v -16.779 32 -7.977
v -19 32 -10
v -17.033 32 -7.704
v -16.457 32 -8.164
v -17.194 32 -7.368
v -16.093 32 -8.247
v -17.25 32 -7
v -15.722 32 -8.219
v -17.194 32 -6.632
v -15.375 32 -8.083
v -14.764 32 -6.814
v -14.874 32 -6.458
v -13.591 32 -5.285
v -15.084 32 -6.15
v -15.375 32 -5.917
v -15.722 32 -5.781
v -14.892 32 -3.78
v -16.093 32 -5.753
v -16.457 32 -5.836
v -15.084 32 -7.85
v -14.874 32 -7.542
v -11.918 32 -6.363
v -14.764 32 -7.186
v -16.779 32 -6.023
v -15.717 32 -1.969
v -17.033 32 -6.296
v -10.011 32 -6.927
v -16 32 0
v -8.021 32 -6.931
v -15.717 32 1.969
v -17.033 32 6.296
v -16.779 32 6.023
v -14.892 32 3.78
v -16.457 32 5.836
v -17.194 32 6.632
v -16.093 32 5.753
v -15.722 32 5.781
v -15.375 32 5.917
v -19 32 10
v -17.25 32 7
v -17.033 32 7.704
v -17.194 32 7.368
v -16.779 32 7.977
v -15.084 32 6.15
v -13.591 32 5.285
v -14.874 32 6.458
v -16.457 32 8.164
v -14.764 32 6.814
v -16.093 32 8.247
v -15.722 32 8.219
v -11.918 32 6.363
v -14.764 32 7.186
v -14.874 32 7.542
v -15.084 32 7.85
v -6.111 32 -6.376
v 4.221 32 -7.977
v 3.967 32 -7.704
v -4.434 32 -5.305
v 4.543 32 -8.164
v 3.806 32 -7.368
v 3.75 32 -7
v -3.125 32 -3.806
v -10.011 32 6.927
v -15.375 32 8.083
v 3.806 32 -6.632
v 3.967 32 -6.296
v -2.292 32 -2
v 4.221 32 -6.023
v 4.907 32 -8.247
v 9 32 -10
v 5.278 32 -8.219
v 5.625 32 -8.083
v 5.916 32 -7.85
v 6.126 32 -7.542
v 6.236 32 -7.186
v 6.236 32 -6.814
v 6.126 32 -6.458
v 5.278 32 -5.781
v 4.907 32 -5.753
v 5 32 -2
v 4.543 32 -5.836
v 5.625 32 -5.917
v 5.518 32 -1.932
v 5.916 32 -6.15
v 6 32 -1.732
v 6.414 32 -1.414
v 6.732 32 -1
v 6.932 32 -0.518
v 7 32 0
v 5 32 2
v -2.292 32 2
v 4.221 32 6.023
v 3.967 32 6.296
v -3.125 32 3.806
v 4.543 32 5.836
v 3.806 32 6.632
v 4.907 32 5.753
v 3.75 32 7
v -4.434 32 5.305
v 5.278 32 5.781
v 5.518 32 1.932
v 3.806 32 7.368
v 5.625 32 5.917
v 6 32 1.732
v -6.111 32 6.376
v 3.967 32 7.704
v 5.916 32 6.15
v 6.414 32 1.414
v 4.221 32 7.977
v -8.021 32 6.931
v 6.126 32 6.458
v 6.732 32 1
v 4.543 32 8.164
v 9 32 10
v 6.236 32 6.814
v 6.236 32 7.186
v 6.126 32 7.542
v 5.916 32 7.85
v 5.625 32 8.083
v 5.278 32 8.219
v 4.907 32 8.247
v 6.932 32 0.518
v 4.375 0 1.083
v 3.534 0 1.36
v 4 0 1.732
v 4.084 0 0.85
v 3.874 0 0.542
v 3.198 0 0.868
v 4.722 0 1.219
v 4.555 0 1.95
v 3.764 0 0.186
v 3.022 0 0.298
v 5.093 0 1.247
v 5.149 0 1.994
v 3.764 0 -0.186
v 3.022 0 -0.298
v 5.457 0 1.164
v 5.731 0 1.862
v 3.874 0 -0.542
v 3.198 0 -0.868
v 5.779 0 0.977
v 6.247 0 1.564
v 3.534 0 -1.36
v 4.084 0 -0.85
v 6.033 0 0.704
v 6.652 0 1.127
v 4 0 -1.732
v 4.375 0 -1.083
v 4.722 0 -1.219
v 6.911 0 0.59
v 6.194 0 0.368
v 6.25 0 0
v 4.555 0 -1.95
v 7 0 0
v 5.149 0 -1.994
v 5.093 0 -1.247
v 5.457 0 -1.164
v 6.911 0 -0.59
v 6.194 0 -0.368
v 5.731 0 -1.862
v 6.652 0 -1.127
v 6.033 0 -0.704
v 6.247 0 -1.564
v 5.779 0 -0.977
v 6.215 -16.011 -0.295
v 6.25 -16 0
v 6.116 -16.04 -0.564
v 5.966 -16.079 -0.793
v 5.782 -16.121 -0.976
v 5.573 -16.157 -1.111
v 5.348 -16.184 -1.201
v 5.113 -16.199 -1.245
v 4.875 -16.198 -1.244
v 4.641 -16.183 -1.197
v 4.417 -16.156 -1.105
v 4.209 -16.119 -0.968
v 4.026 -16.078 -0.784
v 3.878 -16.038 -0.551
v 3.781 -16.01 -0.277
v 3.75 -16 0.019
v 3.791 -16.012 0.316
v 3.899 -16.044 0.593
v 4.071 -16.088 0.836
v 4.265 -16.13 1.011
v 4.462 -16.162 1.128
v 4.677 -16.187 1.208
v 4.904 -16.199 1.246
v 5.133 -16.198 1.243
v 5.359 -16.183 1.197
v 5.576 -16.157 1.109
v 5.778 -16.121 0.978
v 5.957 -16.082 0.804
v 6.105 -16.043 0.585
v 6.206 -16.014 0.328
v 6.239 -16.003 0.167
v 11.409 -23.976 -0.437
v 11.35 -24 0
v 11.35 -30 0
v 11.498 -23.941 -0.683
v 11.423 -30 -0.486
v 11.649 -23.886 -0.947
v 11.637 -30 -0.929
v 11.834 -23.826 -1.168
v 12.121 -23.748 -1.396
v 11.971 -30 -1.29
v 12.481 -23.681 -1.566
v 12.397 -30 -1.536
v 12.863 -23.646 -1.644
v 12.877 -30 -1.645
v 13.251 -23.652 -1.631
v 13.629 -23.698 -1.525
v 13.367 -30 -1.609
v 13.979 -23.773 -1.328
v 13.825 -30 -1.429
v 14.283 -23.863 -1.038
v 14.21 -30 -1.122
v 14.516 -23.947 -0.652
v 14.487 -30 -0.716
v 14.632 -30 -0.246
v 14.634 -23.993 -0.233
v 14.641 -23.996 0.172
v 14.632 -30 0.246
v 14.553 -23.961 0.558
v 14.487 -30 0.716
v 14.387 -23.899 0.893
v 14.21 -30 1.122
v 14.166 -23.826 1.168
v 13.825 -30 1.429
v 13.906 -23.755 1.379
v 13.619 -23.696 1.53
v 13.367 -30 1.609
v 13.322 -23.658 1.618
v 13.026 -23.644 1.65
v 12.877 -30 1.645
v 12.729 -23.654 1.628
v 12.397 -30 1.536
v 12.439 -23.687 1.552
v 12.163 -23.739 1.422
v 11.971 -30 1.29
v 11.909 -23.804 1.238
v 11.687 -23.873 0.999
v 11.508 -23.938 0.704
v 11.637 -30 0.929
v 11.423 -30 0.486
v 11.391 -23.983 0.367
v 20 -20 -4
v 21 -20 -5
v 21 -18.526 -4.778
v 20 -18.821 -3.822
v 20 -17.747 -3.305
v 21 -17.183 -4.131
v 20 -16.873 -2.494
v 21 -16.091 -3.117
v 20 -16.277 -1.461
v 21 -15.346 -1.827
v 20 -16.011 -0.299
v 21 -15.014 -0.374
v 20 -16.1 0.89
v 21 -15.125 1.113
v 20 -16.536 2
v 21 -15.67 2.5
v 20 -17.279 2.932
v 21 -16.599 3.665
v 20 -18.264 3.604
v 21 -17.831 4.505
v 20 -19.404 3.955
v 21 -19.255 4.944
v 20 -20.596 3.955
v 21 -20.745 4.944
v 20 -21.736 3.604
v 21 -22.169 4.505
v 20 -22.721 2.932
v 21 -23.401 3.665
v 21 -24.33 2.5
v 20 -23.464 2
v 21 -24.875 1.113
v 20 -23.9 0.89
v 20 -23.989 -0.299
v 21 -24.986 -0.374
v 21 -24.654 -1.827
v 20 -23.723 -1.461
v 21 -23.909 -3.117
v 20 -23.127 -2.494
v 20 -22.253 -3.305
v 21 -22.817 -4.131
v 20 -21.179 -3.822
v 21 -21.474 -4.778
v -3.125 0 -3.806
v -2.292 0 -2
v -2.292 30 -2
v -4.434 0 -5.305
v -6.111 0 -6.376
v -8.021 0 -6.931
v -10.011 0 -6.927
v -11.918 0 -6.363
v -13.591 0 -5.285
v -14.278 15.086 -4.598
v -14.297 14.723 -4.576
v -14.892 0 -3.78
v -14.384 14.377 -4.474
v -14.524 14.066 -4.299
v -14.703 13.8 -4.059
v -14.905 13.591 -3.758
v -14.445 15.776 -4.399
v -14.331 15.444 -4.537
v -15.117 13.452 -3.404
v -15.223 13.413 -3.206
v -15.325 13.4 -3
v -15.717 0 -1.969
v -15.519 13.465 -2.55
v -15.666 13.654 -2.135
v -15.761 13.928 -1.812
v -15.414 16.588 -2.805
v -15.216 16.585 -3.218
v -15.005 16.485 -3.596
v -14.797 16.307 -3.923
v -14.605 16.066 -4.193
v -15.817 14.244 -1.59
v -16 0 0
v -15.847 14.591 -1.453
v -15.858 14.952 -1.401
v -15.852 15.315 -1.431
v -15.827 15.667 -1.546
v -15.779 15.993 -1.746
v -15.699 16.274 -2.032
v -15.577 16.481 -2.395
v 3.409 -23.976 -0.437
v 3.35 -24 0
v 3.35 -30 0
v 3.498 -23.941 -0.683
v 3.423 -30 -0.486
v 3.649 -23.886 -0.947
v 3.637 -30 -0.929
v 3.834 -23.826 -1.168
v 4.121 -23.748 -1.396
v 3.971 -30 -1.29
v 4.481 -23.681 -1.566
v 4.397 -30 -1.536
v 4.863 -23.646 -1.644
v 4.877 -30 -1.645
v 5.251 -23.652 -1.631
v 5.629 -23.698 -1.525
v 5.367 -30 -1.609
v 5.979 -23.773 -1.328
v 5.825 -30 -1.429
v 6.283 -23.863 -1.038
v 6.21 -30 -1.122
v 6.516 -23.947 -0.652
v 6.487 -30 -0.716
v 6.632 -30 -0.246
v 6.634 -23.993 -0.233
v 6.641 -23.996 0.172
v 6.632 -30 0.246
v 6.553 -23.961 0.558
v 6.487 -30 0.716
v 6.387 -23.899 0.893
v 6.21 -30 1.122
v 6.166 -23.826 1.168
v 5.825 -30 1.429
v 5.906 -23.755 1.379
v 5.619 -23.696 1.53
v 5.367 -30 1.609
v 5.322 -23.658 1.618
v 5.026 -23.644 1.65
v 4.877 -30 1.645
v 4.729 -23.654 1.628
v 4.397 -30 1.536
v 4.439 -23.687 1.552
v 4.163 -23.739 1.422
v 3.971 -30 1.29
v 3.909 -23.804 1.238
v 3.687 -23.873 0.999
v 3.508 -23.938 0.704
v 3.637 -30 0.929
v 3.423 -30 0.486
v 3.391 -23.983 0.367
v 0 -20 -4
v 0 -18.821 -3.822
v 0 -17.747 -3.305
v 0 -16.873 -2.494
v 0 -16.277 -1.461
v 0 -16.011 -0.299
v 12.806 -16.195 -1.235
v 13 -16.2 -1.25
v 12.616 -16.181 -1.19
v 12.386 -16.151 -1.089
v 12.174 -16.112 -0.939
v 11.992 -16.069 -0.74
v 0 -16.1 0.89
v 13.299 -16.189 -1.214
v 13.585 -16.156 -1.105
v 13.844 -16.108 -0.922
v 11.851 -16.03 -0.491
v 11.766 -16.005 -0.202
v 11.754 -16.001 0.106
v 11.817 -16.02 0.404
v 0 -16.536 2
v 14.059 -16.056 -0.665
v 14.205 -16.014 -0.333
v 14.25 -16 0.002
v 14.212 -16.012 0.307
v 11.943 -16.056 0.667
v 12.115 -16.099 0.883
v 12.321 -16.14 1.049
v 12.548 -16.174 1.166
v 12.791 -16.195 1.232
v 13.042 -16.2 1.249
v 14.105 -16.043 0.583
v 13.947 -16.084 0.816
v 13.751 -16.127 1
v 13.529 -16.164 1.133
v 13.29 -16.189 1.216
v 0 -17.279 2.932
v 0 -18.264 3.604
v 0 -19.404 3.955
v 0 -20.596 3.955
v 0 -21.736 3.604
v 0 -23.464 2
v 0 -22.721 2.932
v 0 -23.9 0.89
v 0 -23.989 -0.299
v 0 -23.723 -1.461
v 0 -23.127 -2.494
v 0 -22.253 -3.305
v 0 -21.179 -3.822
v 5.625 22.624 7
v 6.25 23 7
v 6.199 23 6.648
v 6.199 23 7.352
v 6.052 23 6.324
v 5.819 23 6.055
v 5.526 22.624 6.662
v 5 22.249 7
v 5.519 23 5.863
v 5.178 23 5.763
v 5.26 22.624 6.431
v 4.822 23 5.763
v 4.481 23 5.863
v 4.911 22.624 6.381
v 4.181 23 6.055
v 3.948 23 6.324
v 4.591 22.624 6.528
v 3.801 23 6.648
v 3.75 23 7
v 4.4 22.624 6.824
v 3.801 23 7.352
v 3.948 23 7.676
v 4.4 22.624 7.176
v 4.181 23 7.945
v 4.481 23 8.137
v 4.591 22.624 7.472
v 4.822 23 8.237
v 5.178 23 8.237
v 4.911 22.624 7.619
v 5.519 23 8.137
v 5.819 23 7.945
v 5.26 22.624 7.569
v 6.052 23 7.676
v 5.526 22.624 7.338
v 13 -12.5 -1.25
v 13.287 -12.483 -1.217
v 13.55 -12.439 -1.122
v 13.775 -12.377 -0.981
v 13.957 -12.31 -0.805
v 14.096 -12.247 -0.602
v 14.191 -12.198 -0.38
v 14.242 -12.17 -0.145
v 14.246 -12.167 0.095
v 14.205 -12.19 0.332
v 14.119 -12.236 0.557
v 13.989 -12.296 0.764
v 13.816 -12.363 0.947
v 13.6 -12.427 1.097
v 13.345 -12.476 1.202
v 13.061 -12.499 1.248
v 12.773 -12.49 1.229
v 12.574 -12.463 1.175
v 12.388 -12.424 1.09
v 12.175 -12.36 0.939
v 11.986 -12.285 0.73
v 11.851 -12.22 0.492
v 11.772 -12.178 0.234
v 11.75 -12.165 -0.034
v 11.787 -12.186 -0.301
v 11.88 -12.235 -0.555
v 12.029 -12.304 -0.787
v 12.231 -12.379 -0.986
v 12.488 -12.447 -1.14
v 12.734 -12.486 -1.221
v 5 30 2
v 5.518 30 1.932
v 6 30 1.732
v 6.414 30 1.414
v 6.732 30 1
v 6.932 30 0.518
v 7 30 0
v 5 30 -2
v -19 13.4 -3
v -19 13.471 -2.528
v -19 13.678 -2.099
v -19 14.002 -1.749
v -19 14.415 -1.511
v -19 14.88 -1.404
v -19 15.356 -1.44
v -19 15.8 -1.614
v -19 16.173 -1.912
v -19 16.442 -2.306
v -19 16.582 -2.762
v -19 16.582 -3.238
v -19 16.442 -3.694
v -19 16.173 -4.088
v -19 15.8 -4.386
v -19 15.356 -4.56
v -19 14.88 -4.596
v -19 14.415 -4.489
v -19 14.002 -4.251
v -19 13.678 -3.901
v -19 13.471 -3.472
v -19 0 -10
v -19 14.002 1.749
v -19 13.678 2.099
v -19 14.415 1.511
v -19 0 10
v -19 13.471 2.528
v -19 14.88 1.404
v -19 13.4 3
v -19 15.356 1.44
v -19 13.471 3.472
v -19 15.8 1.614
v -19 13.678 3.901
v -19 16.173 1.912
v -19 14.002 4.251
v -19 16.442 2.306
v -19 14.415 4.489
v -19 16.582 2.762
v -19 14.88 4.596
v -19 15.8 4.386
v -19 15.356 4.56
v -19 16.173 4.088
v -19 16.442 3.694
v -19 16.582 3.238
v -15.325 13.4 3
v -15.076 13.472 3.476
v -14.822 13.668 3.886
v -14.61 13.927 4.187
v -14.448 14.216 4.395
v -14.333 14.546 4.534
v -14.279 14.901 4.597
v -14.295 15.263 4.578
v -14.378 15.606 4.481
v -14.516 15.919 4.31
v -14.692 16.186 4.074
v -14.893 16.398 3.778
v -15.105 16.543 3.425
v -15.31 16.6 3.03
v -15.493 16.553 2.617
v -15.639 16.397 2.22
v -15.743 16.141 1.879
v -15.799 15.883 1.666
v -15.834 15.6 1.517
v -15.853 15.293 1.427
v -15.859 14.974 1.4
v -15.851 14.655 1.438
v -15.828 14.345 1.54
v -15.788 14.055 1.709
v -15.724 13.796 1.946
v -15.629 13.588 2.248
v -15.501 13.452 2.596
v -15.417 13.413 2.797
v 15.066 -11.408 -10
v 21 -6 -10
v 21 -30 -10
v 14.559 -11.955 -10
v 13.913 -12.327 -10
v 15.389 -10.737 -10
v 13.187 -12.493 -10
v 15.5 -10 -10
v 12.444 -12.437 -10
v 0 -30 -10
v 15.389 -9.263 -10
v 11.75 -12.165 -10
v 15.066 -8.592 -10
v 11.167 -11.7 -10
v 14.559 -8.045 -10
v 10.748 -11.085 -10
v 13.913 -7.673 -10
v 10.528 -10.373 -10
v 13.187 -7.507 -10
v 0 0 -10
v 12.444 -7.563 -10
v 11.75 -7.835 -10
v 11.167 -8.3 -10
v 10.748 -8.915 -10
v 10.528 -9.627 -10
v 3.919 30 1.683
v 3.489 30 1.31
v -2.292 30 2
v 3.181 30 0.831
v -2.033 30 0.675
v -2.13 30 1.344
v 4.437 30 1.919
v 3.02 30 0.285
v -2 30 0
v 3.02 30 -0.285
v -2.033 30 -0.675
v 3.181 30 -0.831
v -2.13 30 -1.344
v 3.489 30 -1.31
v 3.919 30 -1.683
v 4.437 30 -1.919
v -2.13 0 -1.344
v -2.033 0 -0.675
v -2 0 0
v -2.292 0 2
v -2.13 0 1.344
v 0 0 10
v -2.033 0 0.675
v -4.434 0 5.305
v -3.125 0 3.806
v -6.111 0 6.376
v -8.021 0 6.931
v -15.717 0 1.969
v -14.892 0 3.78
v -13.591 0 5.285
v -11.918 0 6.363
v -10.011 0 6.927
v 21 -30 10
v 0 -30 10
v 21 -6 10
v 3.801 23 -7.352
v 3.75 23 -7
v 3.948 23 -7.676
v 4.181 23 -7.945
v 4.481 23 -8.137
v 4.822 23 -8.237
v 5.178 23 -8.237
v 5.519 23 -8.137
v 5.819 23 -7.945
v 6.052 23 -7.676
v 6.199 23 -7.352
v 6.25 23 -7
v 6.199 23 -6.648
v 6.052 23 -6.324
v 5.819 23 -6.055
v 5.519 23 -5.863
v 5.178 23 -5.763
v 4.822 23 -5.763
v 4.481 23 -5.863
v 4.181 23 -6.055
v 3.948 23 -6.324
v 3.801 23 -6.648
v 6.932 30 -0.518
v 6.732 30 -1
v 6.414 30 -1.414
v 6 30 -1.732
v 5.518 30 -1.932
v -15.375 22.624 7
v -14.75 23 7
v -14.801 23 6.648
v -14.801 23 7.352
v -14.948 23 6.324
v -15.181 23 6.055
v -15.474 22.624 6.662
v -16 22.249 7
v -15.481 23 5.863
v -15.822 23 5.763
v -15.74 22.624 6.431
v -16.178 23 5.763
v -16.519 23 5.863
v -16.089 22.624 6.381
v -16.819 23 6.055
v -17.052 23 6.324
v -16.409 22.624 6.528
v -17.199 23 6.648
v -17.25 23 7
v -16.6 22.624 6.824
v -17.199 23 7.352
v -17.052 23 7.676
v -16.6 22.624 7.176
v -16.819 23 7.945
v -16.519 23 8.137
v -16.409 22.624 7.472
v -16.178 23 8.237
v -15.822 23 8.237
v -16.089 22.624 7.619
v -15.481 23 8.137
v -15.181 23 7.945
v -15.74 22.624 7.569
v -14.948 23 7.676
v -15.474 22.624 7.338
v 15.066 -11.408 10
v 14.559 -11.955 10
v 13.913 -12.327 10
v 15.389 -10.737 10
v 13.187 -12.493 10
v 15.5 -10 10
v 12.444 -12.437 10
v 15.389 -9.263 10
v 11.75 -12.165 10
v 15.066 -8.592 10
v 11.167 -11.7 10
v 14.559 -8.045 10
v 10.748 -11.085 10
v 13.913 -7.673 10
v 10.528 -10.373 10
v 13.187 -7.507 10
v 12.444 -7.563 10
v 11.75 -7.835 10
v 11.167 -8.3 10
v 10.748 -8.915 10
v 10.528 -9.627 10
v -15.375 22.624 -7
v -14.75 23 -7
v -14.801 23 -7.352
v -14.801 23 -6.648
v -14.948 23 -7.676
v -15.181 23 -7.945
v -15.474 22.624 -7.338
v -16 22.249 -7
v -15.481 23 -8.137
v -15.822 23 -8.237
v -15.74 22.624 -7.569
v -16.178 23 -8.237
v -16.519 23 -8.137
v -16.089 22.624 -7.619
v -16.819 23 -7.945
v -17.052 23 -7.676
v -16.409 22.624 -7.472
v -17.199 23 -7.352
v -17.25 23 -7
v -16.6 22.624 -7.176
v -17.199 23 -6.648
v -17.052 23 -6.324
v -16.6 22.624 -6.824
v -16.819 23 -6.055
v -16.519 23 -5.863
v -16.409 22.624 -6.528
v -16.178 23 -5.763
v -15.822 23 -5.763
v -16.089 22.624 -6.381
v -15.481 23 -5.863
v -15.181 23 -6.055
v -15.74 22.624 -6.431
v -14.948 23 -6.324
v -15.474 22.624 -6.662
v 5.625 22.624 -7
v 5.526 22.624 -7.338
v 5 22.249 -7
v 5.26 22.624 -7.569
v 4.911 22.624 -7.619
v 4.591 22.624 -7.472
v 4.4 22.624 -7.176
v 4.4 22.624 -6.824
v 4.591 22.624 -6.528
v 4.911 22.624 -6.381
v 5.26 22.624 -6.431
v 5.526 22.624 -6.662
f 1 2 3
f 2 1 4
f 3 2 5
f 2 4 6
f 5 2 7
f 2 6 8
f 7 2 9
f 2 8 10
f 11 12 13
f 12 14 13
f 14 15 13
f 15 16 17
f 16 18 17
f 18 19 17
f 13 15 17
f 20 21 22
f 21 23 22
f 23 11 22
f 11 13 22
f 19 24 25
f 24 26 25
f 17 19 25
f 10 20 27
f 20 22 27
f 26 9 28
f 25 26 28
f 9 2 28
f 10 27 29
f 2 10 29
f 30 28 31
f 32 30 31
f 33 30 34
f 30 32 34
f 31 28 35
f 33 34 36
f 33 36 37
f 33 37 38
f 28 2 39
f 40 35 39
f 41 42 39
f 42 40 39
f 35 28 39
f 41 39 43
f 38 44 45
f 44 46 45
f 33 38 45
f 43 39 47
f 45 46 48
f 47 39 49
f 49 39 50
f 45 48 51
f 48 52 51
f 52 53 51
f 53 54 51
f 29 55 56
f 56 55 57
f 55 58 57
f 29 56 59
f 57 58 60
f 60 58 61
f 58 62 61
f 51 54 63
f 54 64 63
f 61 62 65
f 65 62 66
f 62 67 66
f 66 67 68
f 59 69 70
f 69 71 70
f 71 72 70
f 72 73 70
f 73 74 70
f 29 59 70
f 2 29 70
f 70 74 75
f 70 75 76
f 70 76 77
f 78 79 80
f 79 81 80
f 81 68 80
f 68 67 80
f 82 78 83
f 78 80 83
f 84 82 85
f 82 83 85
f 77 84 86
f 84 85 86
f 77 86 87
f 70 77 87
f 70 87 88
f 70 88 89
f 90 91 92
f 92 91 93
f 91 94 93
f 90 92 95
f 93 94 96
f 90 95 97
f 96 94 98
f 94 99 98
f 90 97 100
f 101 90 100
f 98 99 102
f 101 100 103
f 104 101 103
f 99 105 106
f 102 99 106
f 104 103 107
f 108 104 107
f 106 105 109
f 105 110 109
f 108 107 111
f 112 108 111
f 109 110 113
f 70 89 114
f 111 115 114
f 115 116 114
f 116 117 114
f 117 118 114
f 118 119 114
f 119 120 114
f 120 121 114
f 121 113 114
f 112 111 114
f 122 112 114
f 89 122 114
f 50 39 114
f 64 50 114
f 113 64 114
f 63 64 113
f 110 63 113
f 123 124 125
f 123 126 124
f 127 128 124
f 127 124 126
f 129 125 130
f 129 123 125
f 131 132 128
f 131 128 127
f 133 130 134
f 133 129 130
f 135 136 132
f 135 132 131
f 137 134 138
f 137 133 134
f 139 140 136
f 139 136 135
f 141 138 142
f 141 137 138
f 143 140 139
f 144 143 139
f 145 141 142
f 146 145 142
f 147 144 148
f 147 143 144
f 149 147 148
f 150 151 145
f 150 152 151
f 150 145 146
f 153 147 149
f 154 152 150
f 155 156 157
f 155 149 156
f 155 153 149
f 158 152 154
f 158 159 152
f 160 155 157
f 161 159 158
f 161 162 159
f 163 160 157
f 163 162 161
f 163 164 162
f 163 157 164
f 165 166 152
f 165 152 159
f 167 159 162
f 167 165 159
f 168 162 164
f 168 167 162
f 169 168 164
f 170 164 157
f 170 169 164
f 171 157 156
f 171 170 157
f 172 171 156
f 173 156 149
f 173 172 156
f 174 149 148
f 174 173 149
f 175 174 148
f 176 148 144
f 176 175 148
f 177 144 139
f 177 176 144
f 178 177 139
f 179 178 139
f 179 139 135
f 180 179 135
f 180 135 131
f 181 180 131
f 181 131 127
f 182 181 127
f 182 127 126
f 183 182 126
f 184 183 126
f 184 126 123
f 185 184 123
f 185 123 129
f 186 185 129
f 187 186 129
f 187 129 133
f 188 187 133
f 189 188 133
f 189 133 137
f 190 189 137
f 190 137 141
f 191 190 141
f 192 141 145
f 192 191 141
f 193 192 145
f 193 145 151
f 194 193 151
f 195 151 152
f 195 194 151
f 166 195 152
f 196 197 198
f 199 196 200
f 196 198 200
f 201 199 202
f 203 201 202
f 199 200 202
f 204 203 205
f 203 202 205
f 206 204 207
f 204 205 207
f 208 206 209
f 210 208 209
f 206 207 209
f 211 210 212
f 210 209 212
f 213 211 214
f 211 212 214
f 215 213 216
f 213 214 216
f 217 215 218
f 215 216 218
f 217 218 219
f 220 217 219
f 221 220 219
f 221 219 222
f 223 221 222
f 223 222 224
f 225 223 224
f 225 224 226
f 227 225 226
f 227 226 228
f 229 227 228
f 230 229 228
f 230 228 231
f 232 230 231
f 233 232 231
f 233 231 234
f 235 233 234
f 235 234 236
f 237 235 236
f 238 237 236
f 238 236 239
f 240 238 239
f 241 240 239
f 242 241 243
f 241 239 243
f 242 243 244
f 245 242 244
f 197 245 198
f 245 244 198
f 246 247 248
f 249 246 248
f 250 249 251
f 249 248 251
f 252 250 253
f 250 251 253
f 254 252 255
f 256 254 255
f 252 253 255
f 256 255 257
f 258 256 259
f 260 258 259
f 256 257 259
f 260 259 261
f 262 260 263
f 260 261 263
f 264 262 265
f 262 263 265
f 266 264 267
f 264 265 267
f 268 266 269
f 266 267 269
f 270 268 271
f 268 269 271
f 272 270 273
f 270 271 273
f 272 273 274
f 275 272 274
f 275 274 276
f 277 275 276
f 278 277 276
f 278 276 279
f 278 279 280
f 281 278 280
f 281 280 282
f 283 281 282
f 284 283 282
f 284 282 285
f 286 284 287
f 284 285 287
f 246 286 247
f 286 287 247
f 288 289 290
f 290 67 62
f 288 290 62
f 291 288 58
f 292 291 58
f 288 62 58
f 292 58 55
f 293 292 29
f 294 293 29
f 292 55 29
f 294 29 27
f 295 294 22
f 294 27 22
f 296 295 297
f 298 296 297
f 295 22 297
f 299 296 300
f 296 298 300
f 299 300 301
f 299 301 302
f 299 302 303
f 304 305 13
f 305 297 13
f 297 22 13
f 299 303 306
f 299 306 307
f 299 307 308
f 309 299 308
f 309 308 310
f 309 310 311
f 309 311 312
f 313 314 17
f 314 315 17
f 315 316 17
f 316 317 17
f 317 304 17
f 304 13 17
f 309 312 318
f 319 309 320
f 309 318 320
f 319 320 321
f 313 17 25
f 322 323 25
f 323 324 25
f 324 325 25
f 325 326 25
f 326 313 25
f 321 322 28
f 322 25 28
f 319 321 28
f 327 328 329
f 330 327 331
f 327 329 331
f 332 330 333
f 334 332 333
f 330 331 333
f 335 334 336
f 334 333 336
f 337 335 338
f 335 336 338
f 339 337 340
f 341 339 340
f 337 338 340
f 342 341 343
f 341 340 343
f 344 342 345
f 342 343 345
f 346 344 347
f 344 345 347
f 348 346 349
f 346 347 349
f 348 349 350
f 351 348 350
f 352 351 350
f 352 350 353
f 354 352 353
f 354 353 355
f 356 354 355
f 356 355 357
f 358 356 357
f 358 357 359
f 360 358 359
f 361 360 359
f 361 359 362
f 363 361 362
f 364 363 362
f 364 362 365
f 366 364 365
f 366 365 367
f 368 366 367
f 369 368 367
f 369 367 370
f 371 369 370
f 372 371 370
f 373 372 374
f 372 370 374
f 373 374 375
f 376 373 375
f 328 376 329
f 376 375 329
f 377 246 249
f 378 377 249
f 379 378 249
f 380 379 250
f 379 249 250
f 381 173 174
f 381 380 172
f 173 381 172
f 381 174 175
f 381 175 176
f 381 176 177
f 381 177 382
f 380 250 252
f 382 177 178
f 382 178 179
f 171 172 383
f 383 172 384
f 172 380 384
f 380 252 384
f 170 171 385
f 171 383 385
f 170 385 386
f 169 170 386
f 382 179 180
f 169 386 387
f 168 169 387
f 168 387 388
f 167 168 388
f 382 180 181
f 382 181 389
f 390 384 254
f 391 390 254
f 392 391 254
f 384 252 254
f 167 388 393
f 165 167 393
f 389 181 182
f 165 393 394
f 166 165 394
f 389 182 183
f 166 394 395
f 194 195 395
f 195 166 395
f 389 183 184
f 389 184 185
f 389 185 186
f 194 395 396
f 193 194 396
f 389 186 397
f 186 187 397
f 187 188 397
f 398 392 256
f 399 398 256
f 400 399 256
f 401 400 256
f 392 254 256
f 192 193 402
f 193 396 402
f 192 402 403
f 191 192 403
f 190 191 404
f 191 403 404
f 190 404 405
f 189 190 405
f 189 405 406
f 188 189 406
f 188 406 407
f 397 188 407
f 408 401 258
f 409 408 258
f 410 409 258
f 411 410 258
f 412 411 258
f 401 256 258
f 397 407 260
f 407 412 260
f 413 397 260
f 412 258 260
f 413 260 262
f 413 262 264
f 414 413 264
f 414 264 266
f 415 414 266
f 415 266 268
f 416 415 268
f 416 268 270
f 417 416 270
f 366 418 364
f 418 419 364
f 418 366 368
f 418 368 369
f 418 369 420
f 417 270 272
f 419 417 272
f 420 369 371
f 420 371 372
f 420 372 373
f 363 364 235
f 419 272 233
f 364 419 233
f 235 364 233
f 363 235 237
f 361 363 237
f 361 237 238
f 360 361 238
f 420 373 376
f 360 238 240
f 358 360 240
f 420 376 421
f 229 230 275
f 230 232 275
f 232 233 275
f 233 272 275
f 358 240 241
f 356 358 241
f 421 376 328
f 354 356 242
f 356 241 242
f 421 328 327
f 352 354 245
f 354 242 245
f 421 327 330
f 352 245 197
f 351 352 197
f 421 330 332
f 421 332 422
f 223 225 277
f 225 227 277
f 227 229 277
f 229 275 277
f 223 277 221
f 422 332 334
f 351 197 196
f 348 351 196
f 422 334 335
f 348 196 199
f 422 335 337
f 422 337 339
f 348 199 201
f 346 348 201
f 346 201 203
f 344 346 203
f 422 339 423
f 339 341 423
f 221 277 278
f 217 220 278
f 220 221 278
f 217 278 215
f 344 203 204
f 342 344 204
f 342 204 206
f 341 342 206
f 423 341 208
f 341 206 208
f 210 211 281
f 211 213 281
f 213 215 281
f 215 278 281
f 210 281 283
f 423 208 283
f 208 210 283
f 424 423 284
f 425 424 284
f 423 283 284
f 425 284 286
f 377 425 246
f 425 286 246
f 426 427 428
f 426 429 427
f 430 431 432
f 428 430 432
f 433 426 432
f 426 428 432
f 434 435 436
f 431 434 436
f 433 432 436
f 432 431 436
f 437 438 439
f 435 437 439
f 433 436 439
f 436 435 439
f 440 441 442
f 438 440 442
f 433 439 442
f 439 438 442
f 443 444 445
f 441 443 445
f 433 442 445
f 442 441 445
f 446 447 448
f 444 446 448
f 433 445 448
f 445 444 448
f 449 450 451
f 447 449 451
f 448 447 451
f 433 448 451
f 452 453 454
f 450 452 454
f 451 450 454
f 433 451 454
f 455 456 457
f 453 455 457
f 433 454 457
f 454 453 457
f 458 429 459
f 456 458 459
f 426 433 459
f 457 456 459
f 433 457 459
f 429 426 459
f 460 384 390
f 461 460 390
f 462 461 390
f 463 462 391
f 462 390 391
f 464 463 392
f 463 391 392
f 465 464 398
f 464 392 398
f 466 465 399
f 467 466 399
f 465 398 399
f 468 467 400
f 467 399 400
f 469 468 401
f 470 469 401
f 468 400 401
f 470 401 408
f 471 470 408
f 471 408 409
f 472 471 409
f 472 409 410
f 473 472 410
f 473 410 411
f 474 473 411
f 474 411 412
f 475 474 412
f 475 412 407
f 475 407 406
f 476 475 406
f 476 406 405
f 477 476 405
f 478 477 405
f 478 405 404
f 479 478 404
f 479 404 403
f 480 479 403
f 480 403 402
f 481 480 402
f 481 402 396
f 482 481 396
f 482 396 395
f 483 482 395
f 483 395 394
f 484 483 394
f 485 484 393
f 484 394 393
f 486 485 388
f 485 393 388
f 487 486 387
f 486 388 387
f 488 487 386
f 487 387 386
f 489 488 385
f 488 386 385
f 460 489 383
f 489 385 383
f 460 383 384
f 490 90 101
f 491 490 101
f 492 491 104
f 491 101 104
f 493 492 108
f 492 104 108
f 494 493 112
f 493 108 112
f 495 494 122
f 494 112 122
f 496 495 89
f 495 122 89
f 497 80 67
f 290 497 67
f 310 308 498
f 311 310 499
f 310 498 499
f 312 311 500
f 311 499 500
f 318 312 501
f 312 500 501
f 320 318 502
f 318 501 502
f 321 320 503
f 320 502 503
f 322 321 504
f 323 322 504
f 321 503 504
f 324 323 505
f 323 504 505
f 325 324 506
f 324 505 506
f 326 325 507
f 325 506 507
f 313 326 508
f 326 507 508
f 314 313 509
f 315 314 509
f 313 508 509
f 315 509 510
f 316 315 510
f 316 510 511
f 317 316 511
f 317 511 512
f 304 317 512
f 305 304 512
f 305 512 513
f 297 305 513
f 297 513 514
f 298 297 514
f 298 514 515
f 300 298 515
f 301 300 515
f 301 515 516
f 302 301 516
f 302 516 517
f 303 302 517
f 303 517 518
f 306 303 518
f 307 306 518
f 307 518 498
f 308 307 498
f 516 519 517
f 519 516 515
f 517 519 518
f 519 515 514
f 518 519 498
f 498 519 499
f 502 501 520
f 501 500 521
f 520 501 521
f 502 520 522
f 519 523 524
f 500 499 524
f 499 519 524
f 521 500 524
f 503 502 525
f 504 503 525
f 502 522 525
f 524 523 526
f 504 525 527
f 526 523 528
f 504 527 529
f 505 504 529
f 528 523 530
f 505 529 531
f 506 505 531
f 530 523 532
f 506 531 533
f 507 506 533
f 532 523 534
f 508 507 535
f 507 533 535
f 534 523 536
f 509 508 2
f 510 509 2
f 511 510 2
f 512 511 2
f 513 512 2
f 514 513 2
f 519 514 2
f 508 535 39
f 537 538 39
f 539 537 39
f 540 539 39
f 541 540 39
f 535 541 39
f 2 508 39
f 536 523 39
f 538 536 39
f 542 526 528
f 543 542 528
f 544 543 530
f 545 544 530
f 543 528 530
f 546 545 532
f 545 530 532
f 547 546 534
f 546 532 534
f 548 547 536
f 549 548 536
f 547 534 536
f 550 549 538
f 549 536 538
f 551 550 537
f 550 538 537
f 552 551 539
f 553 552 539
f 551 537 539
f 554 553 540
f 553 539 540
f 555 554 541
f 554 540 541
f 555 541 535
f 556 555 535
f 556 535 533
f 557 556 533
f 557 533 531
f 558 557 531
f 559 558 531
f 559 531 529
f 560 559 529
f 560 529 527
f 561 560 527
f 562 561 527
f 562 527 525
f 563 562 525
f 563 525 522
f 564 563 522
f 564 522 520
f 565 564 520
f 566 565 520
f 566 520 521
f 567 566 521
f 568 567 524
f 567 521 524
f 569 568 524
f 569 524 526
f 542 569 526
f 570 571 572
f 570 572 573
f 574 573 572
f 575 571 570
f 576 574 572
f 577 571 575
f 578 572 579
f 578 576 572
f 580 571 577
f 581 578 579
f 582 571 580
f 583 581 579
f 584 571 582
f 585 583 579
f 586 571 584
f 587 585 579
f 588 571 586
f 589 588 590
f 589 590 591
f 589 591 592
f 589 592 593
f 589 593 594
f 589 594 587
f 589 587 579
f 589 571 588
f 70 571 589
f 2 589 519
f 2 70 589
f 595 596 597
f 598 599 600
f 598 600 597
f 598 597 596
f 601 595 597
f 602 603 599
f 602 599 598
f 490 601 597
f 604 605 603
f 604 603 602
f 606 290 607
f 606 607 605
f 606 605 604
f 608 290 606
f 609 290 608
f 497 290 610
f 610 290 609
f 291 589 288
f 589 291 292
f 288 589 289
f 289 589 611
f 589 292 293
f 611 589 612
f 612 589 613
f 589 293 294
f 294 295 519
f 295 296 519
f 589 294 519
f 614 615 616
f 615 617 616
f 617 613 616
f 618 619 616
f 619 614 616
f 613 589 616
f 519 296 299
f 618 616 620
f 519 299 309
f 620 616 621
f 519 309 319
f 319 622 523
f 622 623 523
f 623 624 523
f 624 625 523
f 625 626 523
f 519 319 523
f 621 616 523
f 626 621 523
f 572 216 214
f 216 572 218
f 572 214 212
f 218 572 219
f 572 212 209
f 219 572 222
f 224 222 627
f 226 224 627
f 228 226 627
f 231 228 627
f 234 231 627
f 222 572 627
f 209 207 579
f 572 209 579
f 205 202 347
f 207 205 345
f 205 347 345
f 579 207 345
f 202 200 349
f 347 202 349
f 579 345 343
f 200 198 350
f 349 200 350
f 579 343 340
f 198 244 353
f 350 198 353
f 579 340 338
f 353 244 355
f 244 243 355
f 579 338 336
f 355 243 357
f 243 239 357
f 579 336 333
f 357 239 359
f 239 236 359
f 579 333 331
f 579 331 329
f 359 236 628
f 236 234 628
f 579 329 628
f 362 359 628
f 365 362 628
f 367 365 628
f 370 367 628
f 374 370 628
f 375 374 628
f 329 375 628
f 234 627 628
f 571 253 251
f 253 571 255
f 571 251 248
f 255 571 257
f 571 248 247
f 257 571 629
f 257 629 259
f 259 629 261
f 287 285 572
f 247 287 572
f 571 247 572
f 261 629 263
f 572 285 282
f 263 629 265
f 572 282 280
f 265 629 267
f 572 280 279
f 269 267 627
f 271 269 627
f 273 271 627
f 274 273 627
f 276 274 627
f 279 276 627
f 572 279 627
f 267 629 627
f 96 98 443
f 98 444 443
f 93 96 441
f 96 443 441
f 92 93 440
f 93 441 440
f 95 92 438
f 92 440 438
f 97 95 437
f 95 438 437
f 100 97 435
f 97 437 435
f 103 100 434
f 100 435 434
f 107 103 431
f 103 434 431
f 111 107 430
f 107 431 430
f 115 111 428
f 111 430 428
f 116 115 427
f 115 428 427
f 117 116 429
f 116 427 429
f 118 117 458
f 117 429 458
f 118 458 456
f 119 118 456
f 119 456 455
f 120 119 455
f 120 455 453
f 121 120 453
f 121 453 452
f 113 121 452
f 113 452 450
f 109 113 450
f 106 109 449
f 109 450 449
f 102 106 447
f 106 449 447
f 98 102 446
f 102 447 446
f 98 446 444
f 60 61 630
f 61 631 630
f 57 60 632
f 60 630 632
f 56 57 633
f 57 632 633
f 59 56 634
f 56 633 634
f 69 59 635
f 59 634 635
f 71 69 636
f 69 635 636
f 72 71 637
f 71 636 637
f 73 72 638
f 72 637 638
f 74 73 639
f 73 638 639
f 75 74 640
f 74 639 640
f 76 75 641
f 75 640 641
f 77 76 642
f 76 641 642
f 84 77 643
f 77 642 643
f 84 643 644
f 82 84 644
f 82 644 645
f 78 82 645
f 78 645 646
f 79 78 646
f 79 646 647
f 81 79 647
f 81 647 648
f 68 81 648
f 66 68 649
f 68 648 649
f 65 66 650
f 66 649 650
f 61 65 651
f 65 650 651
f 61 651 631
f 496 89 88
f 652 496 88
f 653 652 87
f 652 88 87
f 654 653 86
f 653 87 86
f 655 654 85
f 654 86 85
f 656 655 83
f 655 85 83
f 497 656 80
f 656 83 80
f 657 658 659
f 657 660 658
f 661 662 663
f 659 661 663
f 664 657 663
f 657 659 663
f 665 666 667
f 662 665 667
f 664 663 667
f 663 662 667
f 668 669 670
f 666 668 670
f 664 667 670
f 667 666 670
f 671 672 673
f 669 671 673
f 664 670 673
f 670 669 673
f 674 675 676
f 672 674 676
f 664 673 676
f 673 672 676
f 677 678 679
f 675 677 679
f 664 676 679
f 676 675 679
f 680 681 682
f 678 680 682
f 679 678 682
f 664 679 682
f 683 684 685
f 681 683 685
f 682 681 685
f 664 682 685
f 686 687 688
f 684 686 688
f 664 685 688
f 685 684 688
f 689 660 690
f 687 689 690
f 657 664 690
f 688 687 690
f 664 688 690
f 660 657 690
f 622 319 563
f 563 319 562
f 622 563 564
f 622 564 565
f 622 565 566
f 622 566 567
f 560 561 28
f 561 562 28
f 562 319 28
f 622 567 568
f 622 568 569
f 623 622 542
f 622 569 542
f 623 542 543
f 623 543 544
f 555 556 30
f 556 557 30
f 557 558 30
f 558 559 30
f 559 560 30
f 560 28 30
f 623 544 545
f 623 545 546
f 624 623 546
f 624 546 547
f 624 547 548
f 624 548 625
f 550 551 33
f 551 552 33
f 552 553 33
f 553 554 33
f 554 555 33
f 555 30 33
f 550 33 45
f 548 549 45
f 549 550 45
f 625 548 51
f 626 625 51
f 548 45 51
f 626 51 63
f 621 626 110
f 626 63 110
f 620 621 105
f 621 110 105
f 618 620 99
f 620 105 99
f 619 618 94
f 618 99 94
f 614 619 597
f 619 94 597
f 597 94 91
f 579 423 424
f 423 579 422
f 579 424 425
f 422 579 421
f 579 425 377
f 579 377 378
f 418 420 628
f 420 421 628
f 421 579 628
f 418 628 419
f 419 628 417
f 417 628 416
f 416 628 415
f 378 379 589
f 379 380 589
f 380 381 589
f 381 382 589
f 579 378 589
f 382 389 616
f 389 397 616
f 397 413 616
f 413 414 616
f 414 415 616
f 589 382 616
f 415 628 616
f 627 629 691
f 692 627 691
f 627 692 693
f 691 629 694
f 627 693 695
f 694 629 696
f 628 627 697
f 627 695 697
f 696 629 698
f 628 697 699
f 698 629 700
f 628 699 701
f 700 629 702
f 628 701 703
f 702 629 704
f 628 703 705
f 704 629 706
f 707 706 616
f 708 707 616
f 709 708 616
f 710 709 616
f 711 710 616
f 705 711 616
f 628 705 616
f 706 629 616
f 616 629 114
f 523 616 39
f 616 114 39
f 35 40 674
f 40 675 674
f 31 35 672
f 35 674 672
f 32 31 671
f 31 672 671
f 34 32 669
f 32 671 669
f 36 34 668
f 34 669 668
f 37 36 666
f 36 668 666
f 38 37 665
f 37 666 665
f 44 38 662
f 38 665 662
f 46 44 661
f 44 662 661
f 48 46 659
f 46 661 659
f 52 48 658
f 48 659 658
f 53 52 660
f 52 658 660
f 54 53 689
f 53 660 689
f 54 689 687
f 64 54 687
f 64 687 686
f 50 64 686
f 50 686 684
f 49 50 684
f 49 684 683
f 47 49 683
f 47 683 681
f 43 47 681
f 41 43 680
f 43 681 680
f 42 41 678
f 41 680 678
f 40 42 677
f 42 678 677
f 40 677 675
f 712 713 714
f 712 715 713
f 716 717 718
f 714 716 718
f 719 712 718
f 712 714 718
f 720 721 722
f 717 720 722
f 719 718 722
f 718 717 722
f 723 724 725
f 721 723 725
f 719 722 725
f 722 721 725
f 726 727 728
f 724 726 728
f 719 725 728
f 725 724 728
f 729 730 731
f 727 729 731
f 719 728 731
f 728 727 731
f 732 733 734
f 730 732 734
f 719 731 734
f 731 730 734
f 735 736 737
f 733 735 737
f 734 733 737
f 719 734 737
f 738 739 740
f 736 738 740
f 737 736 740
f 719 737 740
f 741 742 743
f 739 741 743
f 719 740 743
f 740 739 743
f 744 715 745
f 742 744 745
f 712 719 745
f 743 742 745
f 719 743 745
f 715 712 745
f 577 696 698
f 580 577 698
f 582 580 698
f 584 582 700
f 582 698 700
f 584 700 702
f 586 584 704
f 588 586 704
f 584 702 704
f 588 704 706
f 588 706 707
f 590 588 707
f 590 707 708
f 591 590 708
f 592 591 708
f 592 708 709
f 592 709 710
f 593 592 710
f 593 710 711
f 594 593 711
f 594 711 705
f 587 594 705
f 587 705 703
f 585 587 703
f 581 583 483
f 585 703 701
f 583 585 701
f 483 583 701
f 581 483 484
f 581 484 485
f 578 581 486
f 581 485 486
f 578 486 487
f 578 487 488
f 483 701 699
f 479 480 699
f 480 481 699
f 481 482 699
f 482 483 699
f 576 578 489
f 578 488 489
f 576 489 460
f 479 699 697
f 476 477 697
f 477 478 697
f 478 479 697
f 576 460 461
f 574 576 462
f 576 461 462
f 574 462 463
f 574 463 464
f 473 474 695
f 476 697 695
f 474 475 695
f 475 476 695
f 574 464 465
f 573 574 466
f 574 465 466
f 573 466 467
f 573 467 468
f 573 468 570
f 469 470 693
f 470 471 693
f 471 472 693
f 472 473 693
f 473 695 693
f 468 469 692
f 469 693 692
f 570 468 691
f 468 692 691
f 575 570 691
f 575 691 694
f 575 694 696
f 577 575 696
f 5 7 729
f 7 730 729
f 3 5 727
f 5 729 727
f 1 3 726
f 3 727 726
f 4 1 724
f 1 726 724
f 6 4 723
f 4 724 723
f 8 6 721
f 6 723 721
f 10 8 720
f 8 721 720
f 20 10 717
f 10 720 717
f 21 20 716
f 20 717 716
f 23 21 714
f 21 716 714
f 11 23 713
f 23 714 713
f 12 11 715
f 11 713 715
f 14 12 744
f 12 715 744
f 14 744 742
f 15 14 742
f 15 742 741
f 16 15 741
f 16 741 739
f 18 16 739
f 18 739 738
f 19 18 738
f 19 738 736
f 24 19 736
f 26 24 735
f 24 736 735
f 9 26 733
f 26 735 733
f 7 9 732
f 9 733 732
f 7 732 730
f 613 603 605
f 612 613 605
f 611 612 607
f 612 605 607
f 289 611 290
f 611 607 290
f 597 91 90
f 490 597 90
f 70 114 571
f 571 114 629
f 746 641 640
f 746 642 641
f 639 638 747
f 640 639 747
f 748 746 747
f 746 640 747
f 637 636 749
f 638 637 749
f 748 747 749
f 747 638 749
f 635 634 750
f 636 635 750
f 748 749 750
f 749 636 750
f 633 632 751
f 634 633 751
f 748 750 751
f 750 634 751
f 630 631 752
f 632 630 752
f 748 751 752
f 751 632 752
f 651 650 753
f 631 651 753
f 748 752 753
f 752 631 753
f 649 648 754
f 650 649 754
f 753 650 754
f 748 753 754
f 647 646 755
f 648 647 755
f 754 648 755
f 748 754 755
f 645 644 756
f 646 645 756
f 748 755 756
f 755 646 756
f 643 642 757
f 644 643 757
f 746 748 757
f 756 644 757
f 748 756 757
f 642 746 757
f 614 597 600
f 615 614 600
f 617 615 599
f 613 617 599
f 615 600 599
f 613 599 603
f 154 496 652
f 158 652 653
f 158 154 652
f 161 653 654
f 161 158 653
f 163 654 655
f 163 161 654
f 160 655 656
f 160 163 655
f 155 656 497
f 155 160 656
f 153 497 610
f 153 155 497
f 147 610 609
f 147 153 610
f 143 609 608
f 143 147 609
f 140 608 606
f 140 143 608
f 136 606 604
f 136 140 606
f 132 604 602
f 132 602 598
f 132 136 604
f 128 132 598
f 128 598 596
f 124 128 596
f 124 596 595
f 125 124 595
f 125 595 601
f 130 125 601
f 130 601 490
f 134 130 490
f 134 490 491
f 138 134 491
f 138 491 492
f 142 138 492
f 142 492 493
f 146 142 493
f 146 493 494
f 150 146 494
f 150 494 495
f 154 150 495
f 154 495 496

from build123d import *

# Parameters (mm, degrees)
BOSS_EXTRUDE1_DEPTH     = 10
CUT_EXTRUDE1_DEPTH      = 67.219333
CUT_EXTRUDE2_DEPTH      = 2
M3_TAPPED_HOLE1_D       = 2.5
M3_TAPPED_HOLE1_DEPTH   = 9
M3_TAPPED_HOLE1_TIP     = 0.751076
SKETCH5_R               = 2.5
CUT_EXTRUDE3_DEPTH      = 44.185646
SKETCH6_R               = 4
CUT_EXTRUDE4_DEPTH      = 53.191953
CHAMFER1_SIZE           = 1
HOLE1_OUTLINE_R         = 2
HOLE1_DEPTH             = 30
HOLE1_START             = -16.200329
HOLE1_2_OUTLINE_R       = 1.25
HOLE1_2_DEPTH           = 16.200329
CUT_EXTRUDE5_REACH      = 54.192
CUT_EXTRUDE5_END_RADIUS = 7
SKETCH9_R               = 1.6
M4_TAPPED_HOLE1_REACH   = 68.219
M4_TAPPED_HOLE1_BORE_R  = 1.65
CUT_EXTRUDE6_REACH      = 68.219
CUT_EXTRUDE6_END_RADIUS = 2.5
SKETCH13_R              = 1.25


# Read off the part's stored shape, not the designer's step: Hole1
with BuildPart() as part:
    # Sketch1 → Boss-Extrude1 (new, symmetric)
    with BuildSketch(Plane.XY):
        Polygon((0, 0), (-19, 0), (-19, 32), (9, 32), (21, -6), (21, -30), (0, -30), align=None)
    extrude(amount=BOSS_EXTRUDE1_DEPTH, both=True)

    # Sketch2 → Cut-Extrude1 (cut, through all)
    with BuildSketch(Plane(origin=(0, 32, 0), x_dir=(1, 0, 0), z_dir=(0, 1, 0))):
        with BuildLine():
            ThreePointArc((-2.291796, 2), (-10.010587, 6.926667), (-16, 0))
            Line((-16, 0), (-2, 0))
            ThreePointArc((-2, 0), (-2.073333, 1.010587), (-2.291796, 2))
        make_face()
        with BuildLine():
            Line((-2, 0), (-16, 0))
            ThreePointArc((-16, 0), (-10.010587, -6.926667), (-2.291796, -2))
            ThreePointArc((-2.291796, -2), (-2.073333, -1.010587), (-2, 0))
        make_face()
    extrude(amount=-CUT_EXTRUDE1_DEPTH, mode=Mode.SUBTRACT)

    # Sketch2<3> → Cut-Extrude2 (cut)
    with BuildSketch(Plane(origin=(0, 32, 0), x_dir=(1, 0, 0), z_dir=(0, 1, 0))):
        with BuildLine():
            ThreePointArc((-2.291796, 2), (-2.073333, 1.010587), (-2, 0))
            Line((-2, 0), (3, 0))
            ThreePointArc((3, 0), (3.585786, 1.414214), (5, 2))
            Line((5, 2), (-2.291796, 2))
        make_face()
        with BuildLine():
            Line((3, 0), (-2, 0))
            ThreePointArc((-2, 0), (-2.073333, -1.010587), (-2.291796, -2))
            Line((-2.291796, -2), (5, -2))
            ThreePointArc((5, -2), (3.585786, -1.414214), (3, 0))
        make_face()
        with BuildLine():
            ThreePointArc((5, 2), (3.585786, 1.414214), (3, 0))
            Line((3, 0), (7, 0))
            ThreePointArc((7, 0), (6.414214, 1.414214), (5, 2))
        make_face()
        with BuildLine():
            Line((7, 0), (3, 0))
            ThreePointArc((3, 0), (3.585786, -1.414214), (5, -2))
            ThreePointArc((5, -2), (6.414214, -1.414214), (7, 0))
        make_face()
    extrude(amount=-CUT_EXTRUDE2_DEPTH, mode=Mode.SUBTRACT)

    # M3 Tapped Hole1
    with Locations(Plane(origin=(0, 32, 0), x_dir=(1, 0, 0), z_dir=(0, 1, 0))):
        with Locations((-16, 7), (-16, -7), (5, -7), (5, 7)):
            Hole(M3_TAPPED_HOLE1_D / 2, depth=M3_TAPPED_HOLE1_DEPTH)
            with Locations((0, 0, -(M3_TAPPED_HOLE1_DEPTH + M3_TAPPED_HOLE1_TIP / 2))):  # 118° drill point
                Cone(0, M3_TAPPED_HOLE1_D / 2, M3_TAPPED_HOLE1_TIP, mode=Mode.SUBTRACT)

    # Sketch5 → Cut-Extrude3 (cut, through all)
    with BuildSketch(Plane.XY.offset(10)):
        with Locations((13, -10)):
            Circle(SKETCH5_R)
    extrude(amount=-CUT_EXTRUDE3_DEPTH, mode=Mode.SUBTRACT)

    # Sketch6 → Cut-Extrude4 (cut, through all)
    with BuildSketch(Plane(origin=(21, 0, 0), x_dir=(0, 0, -1), z_dir=(1, 0, 0))):
        with Locations((0, -20)):
            Circle(SKETCH6_R)
    extrude(amount=-CUT_EXTRUDE4_DEPTH, mode=Mode.SUBTRACT)

    # Chamfer1
    chamfer1_edges = [part.edges().sort_by_distance(p)[0] for p in [
        (21, -20, 4),
    ]]
    chamfer(chamfer1_edges, length=CHAMFER1_SIZE)

    # Hole1 outline → Hole1 (cut)
    with BuildSketch(Plane(origin=(0, 0, 0), x_dir=(1, 0, 0), z_dir=(0, 1, 0))):
        with Locations((5, 0)):
            Circle(HOLE1_OUTLINE_R)
    extrude(amount=HOLE1_DEPTH, mode=Mode.SUBTRACT)

    # Hole1 2 outline → Hole1 2 (cut)
    with BuildSketch(Plane(origin=(0, 0, 0), x_dir=(1, 0, 0), z_dir=(0, 1, 0)).offset(HOLE1_START)):
        with Locations((5, 0)):
            Circle(HOLE1_2_OUTLINE_R)
    extrude(amount=HOLE1_2_DEPTH, mode=Mode.SUBTRACT)

    # Cut-Extrude5: up to this cylinder (the profile starts outside it)
    cut_extrude5_end = Plane(origin=(-9, 15, 0), z_dir=(0, 1, 0)) * Cylinder(CUT_EXTRUDE5_END_RADIUS, 123.384, mode=Mode.PRIVATE)
    # Sketch9 → Cut-Extrude5 (cut, up to the surface)
    with BuildSketch(Plane.ZY.offset(19), mode=Mode.PRIVATE) as cut_extrude5_sk1:
        with Locations(Location((-3, 15, 0), (0, 0, 270))):
            Circle(SKETCH9_R)
    cut_extrude5_tool1 = extrude(cut_extrude5_sk1.sketch, amount=-CUT_EXTRUDE5_REACH, mode=Mode.PRIVATE) - cut_extrude5_end
    add(cut_extrude5_tool1.solids().sort_by_distance((-19, 15, -3))[0], mode=Mode.SUBTRACT)
    # Sketch9 → Cut-Extrude5 (cut, up to the surface)
    with BuildSketch(Plane.ZY.offset(19), mode=Mode.PRIVATE) as cut_extrude5_sk2:
        with Locations(Location((3, 15, 0), (0, 0, 270))):
            Circle(SKETCH9_R)
    cut_extrude5_tool2 = extrude(cut_extrude5_sk2.sketch, amount=-CUT_EXTRUDE5_REACH, mode=Mode.PRIVATE) - cut_extrude5_end
    add(cut_extrude5_tool2.solids().sort_by_distance((-19, 15, 3))[0], mode=Mode.SUBTRACT)

    # M4 Tapped Hole1 bore → M4 Tapped Hole1 (cut, up to next)
    with BuildSketch(Plane(origin=(0, -30, 0), x_dir=(-1, 0, 0), z_dir=(0, -1, 0)), mode=Mode.PRIVATE) as m4_tapped_hole1_sk1:
        with Locations((-5, 0)):
            Circle(M4_TAPPED_HOLE1_BORE_R)
    m4_tapped_hole1_tool1 = extrude(m4_tapped_hole1_sk1.sketch, amount=-M4_TAPPED_HOLE1_REACH, mode=Mode.PRIVATE) & part.part
    # M4 Tapped Hole1 bore → M4 Tapped Hole1 (cut, up to next)
    with BuildSketch(Plane(origin=(0, -30, 0), x_dir=(-1, 0, 0), z_dir=(0, -1, 0)), mode=Mode.PRIVATE) as m4_tapped_hole1_sk2:
        with Locations((-13, 0)):
            Circle(M4_TAPPED_HOLE1_BORE_R)
    m4_tapped_hole1_tool2 = extrude(m4_tapped_hole1_sk2.sketch, amount=-M4_TAPPED_HOLE1_REACH, mode=Mode.PRIVATE) & part.part
    add(m4_tapped_hole1_tool1.solids().sort_by_distance((5, -30, 0))[0], mode=Mode.SUBTRACT)
    add(m4_tapped_hole1_tool2.solids().sort_by_distance((13, -30, 0))[0], mode=Mode.SUBTRACT)

    # Cut-Extrude6: up to this cylinder (the profile starts outside it)
    cut_extrude6_end = Plane(origin=(13, -10, 0), z_dir=(0, 0, 1)) * Cylinder(CUT_EXTRUDE6_END_RADIUS, 142.438, mode=Mode.PRIVATE)
    # Sketch13 → Cut-Extrude6 (cut, up to the surface)
    with BuildSketch(Plane.XZ.offset(30), mode=Mode.PRIVATE) as cut_extrude6_sk1:
        with Locations(Location((13, 0, 0), (0, 0, 270))):
            Circle(SKETCH13_R)
    cut_extrude6_tool1 = extrude(cut_extrude6_sk1.sketch, amount=-CUT_EXTRUDE6_REACH, mode=Mode.PRIVATE) - cut_extrude6_end
    add(cut_extrude6_tool1.solids().sort_by_distance((13, -30, 0))[0], mode=Mode.SUBTRACT)


solid = part.part
